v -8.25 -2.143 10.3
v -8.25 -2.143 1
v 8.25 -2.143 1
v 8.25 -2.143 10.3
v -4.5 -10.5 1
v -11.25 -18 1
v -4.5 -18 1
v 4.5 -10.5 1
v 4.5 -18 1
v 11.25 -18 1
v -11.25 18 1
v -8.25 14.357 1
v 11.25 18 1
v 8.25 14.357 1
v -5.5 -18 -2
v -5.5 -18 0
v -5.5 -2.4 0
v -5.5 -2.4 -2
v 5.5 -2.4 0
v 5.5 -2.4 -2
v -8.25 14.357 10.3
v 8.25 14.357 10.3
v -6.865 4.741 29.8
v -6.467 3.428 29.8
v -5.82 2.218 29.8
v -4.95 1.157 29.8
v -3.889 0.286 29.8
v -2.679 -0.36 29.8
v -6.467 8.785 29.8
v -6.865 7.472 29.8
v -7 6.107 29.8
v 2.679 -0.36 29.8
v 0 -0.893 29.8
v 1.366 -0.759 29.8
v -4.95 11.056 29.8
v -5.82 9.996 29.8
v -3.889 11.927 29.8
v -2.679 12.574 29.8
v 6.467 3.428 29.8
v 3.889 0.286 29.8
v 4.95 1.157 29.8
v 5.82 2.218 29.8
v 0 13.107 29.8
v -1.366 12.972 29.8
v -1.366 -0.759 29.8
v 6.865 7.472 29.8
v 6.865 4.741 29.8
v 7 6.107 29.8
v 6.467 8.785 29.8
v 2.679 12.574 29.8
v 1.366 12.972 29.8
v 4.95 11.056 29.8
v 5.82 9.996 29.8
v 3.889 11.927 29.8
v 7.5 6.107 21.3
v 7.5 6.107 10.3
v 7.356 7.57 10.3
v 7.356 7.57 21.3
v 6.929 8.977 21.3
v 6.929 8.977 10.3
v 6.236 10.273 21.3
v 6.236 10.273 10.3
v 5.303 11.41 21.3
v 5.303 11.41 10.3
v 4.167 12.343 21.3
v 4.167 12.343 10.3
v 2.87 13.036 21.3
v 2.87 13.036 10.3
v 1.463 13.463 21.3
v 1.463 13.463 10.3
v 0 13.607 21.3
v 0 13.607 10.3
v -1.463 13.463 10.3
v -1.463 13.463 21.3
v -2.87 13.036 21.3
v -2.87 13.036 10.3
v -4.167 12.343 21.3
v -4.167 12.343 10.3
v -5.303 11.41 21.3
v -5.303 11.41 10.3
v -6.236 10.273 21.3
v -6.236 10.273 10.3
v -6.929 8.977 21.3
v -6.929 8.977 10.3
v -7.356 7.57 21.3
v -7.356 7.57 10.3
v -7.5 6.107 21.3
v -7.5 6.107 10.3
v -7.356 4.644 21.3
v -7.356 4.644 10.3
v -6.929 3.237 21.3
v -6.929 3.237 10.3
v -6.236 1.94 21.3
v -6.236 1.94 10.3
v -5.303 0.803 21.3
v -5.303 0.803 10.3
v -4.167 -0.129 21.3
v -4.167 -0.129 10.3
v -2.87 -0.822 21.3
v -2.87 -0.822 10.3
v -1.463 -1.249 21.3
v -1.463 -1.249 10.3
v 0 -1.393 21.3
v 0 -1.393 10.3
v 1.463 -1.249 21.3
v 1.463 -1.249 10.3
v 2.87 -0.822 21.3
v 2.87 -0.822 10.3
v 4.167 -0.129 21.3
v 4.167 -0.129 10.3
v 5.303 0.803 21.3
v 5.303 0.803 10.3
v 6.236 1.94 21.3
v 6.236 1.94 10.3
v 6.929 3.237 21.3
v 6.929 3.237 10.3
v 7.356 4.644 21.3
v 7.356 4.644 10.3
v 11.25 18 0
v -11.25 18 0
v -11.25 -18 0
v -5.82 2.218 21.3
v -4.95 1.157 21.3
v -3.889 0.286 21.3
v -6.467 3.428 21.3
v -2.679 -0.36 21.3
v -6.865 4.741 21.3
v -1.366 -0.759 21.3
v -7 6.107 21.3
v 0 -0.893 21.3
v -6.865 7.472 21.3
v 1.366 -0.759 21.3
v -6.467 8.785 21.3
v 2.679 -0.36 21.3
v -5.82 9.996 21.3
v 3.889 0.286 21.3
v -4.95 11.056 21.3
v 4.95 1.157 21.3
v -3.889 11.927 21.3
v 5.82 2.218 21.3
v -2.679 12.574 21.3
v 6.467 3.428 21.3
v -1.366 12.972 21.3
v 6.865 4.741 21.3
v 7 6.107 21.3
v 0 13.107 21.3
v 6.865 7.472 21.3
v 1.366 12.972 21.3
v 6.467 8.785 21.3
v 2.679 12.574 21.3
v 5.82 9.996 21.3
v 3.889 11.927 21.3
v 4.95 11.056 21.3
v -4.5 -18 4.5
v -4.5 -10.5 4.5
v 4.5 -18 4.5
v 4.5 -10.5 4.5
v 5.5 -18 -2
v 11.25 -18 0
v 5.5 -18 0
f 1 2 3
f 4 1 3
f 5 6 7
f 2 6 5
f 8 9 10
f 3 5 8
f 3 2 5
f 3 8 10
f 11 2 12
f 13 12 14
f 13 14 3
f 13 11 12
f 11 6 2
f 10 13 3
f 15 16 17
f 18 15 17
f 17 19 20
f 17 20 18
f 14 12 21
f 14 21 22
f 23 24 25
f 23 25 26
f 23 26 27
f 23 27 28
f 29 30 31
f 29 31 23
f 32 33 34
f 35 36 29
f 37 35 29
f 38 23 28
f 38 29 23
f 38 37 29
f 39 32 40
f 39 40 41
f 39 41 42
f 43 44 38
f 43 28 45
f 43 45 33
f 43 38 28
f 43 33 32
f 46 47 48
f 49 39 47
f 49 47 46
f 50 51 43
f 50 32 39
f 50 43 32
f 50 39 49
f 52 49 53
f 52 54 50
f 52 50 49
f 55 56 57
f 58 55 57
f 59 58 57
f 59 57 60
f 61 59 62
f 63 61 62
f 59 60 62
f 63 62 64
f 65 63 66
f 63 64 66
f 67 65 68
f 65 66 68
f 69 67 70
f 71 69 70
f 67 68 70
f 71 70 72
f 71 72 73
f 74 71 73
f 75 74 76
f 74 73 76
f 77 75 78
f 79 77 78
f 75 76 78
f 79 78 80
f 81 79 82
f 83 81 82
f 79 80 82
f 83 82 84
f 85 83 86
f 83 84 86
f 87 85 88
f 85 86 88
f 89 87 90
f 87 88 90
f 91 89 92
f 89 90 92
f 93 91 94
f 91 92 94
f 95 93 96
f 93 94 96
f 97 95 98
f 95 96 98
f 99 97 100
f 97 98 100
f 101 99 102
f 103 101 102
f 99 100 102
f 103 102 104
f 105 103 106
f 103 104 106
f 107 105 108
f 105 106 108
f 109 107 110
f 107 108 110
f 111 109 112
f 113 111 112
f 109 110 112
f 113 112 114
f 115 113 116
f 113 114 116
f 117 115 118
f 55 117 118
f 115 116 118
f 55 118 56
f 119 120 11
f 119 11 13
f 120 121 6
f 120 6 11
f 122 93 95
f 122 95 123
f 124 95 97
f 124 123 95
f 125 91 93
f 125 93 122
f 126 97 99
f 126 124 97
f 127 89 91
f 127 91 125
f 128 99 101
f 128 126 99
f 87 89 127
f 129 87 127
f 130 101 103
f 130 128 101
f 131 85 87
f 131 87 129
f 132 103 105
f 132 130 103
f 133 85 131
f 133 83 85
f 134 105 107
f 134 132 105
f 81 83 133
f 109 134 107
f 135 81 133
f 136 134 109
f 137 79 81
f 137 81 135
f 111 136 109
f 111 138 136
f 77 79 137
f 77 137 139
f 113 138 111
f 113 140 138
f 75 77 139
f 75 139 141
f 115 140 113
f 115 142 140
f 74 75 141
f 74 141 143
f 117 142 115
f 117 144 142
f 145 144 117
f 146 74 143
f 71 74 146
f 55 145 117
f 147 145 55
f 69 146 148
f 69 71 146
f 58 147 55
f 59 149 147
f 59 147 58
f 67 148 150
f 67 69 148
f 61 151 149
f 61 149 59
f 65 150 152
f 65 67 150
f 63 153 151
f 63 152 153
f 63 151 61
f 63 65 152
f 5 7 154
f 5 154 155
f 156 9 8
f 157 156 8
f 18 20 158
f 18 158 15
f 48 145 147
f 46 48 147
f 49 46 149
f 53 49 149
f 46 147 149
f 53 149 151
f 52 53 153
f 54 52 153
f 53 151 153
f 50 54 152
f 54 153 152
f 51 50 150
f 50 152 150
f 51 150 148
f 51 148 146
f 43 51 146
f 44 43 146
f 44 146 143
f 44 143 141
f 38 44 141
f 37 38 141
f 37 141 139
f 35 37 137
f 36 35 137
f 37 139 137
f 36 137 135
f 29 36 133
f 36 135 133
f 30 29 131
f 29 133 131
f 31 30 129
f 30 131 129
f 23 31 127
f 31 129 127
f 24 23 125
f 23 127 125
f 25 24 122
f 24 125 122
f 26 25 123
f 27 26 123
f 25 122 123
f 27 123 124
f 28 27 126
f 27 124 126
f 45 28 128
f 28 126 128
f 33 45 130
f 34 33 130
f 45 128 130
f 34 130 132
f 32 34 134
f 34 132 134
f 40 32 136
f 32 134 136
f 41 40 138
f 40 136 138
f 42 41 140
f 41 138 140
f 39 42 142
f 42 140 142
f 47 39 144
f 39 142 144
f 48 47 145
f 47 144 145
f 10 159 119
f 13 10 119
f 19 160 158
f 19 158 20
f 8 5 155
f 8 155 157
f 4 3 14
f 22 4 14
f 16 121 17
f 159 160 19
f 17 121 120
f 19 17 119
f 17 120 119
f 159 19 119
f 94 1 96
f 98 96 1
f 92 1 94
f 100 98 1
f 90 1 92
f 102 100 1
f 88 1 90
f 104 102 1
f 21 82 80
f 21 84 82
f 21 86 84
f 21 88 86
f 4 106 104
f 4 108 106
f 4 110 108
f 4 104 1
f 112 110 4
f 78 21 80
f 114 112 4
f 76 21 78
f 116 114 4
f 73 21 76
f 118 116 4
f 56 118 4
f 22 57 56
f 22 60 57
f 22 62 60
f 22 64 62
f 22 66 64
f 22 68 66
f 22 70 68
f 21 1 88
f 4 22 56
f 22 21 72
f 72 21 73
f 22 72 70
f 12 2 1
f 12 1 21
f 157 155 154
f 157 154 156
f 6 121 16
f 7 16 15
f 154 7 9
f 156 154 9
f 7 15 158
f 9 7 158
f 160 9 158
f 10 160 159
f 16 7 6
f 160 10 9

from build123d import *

# Parameters (mm, degrees)
SKETCH1_W           = 22.5
SKETCH1_H           = 36
BOSS_EXTRUDE1_DEPTH = 1
SKETCH2_W           = 16.5
SKETCH2_H           = 16.5
BOSS_EXTRUDE2_DEPTH = 9.3
SKETCH3_R           = 7.5
BOSS_EXTRUDE3_DEPTH = 11
SKETCH4_R           = 7
BOSS_EXTRUDE4_DEPTH = 8.5
SKETCH5_W           = 9
SKETCH5_H           = 7.5
BOSS_EXTRUDE5_DEPTH = 3.5
SKETCH7_W           = 11
SKETCH7_H           = 15.6
BOSS_EXTRUDE6_DEPTH = 2


with BuildPart() as part:
    # Sketch1 → Boss-Extrude1 (new body)
    with BuildSketch(Plane.XY):
        Rectangle(SKETCH1_W, SKETCH1_H)
    extrude(amount=BOSS_EXTRUDE1_DEPTH)

    # Sketch2 → Boss-Extrude2 (add)
    with BuildSketch(Plane.XY.offset(1)):
        with Locations((0, 6.106677741)):
            Rectangle(SKETCH2_W, SKETCH2_H)
    extrude(amount=BOSS_EXTRUDE2_DEPTH)

    # Sketch3 → Boss-Extrude3 (add)
    with BuildSketch(Plane.XY.offset(10.3)):
        with Locations((0, 6.106677741)):
            Circle(SKETCH3_R)
    extrude(amount=BOSS_EXTRUDE3_DEPTH)

    # Sketch4 → Boss-Extrude4 (add)
    with BuildSketch(Plane.XY.offset(21.3)):
        with Locations((0, 6.106677741)):
            Circle(SKETCH4_R)
    extrude(amount=BOSS_EXTRUDE4_DEPTH)

    # Sketch5 → Boss-Extrude5 (add)
    with BuildSketch(Plane.XY.offset(1)):
        with Locations((0, -14.25)):
            Rectangle(SKETCH5_W, SKETCH5_H)
    extrude(amount=BOSS_EXTRUDE5_DEPTH)

    # Sketch7 → Boss-Extrude6 (add)
    with BuildSketch(Plane(origin=(0, 0, 0), x_dir=(-1, 0, 0), z_dir=(0, 0, -1))):
        with Locations((0, -10.2)):
            Rectangle(SKETCH7_W, SKETCH7_H)
    extrude(amount=BOSS_EXTRUDE6_DEPTH)


solid = part.part
